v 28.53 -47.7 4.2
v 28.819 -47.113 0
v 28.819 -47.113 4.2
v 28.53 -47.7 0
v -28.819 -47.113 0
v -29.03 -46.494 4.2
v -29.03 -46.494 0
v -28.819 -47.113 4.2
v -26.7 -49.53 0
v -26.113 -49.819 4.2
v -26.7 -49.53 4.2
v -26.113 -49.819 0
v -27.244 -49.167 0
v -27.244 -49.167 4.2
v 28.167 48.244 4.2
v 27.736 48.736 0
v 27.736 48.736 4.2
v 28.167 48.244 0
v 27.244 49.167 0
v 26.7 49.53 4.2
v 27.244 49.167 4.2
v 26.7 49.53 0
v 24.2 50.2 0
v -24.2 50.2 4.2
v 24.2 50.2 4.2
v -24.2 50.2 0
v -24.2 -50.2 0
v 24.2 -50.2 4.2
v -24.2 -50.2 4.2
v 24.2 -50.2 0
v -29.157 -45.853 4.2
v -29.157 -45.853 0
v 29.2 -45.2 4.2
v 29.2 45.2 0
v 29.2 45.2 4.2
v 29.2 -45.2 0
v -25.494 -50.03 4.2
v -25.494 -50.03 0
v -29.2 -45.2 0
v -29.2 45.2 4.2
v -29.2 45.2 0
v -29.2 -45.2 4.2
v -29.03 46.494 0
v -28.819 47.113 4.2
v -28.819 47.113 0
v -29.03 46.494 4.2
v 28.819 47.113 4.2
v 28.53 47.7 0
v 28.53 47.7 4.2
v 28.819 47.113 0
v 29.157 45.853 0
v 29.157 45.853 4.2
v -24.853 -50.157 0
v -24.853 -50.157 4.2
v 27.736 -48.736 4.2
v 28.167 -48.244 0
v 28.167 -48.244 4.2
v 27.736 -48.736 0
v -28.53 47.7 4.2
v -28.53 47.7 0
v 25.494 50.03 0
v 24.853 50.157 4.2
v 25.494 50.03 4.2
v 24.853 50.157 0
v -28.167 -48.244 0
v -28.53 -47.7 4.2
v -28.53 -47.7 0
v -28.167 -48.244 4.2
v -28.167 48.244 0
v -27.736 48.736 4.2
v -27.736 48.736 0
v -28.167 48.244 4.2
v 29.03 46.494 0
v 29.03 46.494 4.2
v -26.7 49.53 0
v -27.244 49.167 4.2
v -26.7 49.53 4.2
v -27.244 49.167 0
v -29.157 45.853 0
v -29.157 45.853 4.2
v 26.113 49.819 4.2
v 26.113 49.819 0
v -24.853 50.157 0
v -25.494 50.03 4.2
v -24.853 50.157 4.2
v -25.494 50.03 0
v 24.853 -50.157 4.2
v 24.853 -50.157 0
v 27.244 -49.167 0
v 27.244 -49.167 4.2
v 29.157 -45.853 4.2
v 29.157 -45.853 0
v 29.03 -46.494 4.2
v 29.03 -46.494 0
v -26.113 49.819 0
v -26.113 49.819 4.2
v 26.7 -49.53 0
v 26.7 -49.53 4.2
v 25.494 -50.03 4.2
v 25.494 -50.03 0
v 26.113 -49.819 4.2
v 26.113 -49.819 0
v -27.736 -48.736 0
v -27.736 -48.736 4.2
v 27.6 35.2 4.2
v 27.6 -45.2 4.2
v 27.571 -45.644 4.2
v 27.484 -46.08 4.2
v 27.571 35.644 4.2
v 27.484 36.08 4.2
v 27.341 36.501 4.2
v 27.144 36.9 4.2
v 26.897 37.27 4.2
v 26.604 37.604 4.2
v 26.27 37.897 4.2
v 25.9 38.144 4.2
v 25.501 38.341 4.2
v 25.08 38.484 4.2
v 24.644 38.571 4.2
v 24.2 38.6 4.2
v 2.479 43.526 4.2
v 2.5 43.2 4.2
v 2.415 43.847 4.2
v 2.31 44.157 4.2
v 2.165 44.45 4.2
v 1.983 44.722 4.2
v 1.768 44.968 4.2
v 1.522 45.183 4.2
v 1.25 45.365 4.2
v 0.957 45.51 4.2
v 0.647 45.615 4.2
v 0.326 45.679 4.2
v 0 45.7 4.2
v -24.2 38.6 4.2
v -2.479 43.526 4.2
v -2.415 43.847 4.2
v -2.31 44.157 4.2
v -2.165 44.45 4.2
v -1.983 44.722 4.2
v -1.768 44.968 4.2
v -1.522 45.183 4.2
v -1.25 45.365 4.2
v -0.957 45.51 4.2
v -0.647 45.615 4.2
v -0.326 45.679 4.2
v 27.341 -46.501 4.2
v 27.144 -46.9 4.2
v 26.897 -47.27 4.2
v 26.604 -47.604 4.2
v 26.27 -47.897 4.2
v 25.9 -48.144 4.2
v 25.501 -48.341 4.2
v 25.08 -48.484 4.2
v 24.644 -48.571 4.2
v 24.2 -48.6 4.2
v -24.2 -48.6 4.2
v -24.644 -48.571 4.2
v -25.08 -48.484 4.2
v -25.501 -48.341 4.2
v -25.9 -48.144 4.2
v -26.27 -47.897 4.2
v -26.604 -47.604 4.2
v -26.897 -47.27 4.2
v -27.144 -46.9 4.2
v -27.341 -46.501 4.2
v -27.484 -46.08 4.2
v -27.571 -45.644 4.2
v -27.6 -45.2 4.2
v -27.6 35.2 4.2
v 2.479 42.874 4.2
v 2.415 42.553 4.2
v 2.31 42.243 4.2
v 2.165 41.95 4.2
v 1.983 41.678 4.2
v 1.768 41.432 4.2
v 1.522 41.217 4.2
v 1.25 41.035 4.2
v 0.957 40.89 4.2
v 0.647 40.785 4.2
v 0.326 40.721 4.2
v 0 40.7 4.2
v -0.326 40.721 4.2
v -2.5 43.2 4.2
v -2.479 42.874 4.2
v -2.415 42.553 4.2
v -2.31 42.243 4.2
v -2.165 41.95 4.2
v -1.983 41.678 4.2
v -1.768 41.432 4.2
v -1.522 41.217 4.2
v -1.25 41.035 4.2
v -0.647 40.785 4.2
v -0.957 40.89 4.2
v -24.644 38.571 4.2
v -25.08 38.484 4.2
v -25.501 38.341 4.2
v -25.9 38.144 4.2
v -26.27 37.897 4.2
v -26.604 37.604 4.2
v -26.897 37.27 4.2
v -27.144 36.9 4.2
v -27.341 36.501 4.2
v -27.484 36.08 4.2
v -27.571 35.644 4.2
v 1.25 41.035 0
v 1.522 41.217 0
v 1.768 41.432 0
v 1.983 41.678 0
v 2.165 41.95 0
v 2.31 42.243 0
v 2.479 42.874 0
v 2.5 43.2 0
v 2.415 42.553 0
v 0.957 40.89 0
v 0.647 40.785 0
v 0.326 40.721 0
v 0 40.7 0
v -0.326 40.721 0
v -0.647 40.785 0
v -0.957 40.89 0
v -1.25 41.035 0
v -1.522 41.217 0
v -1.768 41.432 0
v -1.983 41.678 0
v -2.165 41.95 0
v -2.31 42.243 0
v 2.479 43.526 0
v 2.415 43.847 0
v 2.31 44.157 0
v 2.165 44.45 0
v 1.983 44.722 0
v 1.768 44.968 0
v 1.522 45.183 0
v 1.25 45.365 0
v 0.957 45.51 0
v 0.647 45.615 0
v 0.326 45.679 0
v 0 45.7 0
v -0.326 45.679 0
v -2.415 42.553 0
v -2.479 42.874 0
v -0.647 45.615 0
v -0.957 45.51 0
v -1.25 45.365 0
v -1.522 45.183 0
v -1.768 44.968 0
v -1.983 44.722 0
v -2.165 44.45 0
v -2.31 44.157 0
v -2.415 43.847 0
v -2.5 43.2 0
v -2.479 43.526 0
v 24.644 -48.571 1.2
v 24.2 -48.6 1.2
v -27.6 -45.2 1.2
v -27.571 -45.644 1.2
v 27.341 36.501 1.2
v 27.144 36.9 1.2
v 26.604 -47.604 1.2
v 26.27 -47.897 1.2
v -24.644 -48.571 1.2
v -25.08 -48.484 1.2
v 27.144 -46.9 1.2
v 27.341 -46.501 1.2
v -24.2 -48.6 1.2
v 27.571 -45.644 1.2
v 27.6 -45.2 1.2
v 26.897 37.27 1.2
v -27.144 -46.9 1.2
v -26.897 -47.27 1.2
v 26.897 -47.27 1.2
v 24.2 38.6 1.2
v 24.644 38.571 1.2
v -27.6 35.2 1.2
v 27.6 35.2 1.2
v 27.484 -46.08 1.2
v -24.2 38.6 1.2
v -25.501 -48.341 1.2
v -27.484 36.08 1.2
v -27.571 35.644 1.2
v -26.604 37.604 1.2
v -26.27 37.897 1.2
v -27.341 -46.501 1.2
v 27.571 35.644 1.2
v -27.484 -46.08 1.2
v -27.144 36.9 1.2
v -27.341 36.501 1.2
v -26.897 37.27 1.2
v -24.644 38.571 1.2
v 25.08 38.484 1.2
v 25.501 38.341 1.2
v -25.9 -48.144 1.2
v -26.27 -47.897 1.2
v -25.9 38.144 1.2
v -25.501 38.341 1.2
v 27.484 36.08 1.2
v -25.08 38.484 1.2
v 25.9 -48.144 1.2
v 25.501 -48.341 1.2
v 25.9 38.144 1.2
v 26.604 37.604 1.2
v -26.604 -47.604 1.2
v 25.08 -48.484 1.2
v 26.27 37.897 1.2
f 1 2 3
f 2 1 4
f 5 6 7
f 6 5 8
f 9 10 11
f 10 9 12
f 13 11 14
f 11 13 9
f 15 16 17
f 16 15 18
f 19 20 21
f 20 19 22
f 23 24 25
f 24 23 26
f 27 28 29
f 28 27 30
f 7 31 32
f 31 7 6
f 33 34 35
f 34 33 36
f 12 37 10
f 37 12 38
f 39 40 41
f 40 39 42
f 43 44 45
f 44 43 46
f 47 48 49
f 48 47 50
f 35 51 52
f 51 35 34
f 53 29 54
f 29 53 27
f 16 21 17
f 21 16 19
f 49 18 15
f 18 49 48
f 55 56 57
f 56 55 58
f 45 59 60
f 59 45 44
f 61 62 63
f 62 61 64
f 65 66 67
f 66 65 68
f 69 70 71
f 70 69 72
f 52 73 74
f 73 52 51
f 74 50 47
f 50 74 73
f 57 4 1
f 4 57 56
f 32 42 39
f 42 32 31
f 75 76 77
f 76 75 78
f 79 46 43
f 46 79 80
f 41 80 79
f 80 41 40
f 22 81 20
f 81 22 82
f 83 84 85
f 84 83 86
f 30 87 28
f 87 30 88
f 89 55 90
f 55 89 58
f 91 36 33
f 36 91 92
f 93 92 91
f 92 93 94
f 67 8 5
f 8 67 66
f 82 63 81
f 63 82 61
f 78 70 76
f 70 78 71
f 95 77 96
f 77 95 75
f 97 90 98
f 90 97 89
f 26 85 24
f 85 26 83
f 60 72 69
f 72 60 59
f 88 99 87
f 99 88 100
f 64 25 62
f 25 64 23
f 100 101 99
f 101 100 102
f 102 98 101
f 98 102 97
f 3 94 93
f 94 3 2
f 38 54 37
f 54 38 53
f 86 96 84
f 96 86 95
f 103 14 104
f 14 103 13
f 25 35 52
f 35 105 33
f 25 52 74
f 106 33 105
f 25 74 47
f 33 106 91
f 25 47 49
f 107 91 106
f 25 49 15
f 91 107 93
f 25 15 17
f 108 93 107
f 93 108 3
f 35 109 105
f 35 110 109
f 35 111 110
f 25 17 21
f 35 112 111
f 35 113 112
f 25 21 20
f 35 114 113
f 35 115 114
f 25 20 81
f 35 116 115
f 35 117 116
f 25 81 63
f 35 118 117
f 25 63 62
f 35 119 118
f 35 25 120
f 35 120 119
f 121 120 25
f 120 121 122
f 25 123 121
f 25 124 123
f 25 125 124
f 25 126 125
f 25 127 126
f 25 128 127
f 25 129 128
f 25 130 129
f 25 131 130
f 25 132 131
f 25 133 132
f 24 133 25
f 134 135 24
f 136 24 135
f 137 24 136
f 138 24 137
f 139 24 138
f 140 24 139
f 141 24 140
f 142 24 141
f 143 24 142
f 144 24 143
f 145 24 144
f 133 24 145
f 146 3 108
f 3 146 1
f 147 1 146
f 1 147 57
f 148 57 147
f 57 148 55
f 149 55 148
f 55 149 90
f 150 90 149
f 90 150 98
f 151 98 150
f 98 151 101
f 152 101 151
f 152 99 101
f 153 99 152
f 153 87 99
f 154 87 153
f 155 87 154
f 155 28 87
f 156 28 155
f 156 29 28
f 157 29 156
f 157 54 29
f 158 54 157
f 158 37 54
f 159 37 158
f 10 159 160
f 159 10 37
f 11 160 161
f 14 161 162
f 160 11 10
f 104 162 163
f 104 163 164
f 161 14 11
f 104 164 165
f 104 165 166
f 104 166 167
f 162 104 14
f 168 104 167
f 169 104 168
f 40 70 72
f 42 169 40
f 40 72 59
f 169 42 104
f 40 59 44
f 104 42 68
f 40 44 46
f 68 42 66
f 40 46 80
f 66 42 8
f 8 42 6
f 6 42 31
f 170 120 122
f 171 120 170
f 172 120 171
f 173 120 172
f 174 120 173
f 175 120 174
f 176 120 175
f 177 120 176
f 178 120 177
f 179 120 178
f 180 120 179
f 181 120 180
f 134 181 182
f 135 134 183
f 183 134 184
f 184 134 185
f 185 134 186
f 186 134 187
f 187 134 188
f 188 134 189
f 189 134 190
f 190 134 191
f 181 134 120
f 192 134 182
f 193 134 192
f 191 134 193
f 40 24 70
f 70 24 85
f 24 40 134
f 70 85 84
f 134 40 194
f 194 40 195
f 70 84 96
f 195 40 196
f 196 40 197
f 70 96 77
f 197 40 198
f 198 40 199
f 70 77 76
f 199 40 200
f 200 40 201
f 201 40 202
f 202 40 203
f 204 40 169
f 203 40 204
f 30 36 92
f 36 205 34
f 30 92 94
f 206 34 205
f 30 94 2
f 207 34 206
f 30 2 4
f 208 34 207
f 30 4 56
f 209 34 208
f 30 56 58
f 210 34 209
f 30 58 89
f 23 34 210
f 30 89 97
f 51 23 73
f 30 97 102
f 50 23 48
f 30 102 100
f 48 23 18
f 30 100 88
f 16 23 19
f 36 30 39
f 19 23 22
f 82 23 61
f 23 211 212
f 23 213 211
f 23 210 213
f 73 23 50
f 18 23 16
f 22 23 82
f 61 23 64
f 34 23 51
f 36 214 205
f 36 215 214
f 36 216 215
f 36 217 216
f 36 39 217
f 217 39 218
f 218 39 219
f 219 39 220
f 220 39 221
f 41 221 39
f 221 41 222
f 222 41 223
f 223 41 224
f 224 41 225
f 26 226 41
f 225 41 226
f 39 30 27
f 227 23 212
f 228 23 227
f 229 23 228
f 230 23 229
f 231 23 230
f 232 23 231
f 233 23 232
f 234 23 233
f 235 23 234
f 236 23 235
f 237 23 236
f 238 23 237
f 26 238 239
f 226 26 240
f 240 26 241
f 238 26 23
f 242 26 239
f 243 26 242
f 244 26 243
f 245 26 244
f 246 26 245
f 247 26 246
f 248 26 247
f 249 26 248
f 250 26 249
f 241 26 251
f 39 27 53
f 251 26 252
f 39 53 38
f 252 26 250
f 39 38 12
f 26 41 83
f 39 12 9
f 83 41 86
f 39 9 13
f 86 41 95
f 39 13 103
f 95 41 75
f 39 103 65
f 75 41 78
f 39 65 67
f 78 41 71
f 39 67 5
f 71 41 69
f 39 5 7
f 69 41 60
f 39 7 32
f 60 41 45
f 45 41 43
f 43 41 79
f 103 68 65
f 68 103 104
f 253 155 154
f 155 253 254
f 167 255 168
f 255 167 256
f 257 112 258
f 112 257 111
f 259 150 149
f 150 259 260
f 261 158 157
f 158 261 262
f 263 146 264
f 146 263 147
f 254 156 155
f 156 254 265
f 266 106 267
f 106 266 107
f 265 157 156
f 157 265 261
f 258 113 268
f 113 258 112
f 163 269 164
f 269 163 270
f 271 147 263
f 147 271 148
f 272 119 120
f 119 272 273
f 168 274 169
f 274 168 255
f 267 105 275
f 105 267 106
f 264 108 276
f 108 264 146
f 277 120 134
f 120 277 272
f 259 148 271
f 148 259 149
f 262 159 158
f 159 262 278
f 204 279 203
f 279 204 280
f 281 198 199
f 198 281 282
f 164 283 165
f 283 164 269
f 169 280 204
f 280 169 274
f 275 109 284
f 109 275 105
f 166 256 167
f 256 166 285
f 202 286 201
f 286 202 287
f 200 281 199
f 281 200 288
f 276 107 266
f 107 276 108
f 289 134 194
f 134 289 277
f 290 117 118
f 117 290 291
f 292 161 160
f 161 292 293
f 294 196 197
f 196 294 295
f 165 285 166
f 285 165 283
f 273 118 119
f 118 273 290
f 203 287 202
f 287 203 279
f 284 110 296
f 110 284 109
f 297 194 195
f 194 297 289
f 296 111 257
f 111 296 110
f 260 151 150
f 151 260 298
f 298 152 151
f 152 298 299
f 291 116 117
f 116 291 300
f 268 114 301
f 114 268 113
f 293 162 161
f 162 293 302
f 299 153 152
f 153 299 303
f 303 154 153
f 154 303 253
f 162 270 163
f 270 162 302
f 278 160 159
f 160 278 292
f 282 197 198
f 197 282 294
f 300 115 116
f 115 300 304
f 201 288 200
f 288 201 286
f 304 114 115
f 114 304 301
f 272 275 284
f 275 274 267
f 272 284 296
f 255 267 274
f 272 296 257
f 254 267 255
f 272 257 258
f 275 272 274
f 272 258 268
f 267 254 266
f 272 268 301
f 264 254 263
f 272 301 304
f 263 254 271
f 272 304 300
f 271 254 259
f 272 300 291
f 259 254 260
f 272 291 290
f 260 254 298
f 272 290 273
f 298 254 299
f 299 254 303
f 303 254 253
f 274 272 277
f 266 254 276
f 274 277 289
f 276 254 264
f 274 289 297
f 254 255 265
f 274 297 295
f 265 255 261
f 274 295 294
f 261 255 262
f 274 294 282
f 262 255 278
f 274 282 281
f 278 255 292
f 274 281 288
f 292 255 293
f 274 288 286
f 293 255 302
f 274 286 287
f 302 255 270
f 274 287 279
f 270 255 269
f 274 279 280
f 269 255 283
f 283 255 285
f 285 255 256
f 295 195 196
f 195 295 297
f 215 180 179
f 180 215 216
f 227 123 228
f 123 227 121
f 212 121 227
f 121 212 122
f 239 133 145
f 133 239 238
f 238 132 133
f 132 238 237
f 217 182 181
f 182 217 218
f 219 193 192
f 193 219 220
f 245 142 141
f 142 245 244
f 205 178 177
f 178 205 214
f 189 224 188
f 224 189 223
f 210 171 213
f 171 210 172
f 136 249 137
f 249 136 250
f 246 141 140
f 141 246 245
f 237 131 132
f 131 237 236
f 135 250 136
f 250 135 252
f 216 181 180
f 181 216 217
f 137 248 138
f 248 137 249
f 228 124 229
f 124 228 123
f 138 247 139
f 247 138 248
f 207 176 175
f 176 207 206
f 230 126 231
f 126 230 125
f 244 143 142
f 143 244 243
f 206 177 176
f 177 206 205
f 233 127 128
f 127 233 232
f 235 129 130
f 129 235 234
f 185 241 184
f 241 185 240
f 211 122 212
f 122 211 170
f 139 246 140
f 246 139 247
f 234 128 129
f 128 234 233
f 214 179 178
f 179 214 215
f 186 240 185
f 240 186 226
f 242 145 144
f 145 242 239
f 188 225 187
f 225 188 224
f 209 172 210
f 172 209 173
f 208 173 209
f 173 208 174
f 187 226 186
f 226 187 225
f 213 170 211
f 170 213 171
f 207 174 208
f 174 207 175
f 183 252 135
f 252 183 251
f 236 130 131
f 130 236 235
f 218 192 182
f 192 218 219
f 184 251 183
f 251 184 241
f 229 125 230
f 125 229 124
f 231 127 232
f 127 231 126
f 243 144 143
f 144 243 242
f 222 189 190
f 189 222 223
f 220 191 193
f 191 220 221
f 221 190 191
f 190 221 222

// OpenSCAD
// Taplock card-tag case - parametric, printable, CERN-OHL-S-2.0
// Adjust the dimensions below to fit your tag, then export as STL.

tag_width  = 54;    // credit-card width
tag_height = 86;    // credit-card height
clearance  = 0.6;   // side clearance in mm
wall       = 1.6;   // wall thickness
floor      = 1.2;   // bottom thickness
lip        = 3.0;   // how far the wall overlaps the tag
corner_r   = 5.0;   // outer corner radius
keyring    = true;  // add a keyring hole

outer_w = tag_width  + 2 * (clearance + wall);
outer_h = tag_height + 2 * (clearance + wall) + (keyring ? 10 : 0);
inner_w = tag_width  + 2 * clearance;
inner_h = tag_height + 2 * clearance;

$fn = 48;

module rounded_box(w, h, height, r) {
    hull() {
        for (x = [-w/2 + r, w/2 - r], y = [-h/2 + r, h/2 - r]) {
            translate([x, y, 0]) cylinder(r = r, h = height);
        }
    }
}

module shell() {
    difference() {
        rounded_box(outer_w, outer_h, floor + lip, corner_r);

        // Cavity open at the top; the remaining rim forms a retaining lip.
        translate([0, -((keyring ? 10 : 0) / 2), floor])
            rounded_box(inner_w, inner_h, lip + 2, max(corner_r - wall, 1));

        if (keyring) {
            translate([0, outer_h/2 - 7, -1])
                cylinder(r = 2.5, h = floor + lip + 2);
        }
    }
}

shell();
